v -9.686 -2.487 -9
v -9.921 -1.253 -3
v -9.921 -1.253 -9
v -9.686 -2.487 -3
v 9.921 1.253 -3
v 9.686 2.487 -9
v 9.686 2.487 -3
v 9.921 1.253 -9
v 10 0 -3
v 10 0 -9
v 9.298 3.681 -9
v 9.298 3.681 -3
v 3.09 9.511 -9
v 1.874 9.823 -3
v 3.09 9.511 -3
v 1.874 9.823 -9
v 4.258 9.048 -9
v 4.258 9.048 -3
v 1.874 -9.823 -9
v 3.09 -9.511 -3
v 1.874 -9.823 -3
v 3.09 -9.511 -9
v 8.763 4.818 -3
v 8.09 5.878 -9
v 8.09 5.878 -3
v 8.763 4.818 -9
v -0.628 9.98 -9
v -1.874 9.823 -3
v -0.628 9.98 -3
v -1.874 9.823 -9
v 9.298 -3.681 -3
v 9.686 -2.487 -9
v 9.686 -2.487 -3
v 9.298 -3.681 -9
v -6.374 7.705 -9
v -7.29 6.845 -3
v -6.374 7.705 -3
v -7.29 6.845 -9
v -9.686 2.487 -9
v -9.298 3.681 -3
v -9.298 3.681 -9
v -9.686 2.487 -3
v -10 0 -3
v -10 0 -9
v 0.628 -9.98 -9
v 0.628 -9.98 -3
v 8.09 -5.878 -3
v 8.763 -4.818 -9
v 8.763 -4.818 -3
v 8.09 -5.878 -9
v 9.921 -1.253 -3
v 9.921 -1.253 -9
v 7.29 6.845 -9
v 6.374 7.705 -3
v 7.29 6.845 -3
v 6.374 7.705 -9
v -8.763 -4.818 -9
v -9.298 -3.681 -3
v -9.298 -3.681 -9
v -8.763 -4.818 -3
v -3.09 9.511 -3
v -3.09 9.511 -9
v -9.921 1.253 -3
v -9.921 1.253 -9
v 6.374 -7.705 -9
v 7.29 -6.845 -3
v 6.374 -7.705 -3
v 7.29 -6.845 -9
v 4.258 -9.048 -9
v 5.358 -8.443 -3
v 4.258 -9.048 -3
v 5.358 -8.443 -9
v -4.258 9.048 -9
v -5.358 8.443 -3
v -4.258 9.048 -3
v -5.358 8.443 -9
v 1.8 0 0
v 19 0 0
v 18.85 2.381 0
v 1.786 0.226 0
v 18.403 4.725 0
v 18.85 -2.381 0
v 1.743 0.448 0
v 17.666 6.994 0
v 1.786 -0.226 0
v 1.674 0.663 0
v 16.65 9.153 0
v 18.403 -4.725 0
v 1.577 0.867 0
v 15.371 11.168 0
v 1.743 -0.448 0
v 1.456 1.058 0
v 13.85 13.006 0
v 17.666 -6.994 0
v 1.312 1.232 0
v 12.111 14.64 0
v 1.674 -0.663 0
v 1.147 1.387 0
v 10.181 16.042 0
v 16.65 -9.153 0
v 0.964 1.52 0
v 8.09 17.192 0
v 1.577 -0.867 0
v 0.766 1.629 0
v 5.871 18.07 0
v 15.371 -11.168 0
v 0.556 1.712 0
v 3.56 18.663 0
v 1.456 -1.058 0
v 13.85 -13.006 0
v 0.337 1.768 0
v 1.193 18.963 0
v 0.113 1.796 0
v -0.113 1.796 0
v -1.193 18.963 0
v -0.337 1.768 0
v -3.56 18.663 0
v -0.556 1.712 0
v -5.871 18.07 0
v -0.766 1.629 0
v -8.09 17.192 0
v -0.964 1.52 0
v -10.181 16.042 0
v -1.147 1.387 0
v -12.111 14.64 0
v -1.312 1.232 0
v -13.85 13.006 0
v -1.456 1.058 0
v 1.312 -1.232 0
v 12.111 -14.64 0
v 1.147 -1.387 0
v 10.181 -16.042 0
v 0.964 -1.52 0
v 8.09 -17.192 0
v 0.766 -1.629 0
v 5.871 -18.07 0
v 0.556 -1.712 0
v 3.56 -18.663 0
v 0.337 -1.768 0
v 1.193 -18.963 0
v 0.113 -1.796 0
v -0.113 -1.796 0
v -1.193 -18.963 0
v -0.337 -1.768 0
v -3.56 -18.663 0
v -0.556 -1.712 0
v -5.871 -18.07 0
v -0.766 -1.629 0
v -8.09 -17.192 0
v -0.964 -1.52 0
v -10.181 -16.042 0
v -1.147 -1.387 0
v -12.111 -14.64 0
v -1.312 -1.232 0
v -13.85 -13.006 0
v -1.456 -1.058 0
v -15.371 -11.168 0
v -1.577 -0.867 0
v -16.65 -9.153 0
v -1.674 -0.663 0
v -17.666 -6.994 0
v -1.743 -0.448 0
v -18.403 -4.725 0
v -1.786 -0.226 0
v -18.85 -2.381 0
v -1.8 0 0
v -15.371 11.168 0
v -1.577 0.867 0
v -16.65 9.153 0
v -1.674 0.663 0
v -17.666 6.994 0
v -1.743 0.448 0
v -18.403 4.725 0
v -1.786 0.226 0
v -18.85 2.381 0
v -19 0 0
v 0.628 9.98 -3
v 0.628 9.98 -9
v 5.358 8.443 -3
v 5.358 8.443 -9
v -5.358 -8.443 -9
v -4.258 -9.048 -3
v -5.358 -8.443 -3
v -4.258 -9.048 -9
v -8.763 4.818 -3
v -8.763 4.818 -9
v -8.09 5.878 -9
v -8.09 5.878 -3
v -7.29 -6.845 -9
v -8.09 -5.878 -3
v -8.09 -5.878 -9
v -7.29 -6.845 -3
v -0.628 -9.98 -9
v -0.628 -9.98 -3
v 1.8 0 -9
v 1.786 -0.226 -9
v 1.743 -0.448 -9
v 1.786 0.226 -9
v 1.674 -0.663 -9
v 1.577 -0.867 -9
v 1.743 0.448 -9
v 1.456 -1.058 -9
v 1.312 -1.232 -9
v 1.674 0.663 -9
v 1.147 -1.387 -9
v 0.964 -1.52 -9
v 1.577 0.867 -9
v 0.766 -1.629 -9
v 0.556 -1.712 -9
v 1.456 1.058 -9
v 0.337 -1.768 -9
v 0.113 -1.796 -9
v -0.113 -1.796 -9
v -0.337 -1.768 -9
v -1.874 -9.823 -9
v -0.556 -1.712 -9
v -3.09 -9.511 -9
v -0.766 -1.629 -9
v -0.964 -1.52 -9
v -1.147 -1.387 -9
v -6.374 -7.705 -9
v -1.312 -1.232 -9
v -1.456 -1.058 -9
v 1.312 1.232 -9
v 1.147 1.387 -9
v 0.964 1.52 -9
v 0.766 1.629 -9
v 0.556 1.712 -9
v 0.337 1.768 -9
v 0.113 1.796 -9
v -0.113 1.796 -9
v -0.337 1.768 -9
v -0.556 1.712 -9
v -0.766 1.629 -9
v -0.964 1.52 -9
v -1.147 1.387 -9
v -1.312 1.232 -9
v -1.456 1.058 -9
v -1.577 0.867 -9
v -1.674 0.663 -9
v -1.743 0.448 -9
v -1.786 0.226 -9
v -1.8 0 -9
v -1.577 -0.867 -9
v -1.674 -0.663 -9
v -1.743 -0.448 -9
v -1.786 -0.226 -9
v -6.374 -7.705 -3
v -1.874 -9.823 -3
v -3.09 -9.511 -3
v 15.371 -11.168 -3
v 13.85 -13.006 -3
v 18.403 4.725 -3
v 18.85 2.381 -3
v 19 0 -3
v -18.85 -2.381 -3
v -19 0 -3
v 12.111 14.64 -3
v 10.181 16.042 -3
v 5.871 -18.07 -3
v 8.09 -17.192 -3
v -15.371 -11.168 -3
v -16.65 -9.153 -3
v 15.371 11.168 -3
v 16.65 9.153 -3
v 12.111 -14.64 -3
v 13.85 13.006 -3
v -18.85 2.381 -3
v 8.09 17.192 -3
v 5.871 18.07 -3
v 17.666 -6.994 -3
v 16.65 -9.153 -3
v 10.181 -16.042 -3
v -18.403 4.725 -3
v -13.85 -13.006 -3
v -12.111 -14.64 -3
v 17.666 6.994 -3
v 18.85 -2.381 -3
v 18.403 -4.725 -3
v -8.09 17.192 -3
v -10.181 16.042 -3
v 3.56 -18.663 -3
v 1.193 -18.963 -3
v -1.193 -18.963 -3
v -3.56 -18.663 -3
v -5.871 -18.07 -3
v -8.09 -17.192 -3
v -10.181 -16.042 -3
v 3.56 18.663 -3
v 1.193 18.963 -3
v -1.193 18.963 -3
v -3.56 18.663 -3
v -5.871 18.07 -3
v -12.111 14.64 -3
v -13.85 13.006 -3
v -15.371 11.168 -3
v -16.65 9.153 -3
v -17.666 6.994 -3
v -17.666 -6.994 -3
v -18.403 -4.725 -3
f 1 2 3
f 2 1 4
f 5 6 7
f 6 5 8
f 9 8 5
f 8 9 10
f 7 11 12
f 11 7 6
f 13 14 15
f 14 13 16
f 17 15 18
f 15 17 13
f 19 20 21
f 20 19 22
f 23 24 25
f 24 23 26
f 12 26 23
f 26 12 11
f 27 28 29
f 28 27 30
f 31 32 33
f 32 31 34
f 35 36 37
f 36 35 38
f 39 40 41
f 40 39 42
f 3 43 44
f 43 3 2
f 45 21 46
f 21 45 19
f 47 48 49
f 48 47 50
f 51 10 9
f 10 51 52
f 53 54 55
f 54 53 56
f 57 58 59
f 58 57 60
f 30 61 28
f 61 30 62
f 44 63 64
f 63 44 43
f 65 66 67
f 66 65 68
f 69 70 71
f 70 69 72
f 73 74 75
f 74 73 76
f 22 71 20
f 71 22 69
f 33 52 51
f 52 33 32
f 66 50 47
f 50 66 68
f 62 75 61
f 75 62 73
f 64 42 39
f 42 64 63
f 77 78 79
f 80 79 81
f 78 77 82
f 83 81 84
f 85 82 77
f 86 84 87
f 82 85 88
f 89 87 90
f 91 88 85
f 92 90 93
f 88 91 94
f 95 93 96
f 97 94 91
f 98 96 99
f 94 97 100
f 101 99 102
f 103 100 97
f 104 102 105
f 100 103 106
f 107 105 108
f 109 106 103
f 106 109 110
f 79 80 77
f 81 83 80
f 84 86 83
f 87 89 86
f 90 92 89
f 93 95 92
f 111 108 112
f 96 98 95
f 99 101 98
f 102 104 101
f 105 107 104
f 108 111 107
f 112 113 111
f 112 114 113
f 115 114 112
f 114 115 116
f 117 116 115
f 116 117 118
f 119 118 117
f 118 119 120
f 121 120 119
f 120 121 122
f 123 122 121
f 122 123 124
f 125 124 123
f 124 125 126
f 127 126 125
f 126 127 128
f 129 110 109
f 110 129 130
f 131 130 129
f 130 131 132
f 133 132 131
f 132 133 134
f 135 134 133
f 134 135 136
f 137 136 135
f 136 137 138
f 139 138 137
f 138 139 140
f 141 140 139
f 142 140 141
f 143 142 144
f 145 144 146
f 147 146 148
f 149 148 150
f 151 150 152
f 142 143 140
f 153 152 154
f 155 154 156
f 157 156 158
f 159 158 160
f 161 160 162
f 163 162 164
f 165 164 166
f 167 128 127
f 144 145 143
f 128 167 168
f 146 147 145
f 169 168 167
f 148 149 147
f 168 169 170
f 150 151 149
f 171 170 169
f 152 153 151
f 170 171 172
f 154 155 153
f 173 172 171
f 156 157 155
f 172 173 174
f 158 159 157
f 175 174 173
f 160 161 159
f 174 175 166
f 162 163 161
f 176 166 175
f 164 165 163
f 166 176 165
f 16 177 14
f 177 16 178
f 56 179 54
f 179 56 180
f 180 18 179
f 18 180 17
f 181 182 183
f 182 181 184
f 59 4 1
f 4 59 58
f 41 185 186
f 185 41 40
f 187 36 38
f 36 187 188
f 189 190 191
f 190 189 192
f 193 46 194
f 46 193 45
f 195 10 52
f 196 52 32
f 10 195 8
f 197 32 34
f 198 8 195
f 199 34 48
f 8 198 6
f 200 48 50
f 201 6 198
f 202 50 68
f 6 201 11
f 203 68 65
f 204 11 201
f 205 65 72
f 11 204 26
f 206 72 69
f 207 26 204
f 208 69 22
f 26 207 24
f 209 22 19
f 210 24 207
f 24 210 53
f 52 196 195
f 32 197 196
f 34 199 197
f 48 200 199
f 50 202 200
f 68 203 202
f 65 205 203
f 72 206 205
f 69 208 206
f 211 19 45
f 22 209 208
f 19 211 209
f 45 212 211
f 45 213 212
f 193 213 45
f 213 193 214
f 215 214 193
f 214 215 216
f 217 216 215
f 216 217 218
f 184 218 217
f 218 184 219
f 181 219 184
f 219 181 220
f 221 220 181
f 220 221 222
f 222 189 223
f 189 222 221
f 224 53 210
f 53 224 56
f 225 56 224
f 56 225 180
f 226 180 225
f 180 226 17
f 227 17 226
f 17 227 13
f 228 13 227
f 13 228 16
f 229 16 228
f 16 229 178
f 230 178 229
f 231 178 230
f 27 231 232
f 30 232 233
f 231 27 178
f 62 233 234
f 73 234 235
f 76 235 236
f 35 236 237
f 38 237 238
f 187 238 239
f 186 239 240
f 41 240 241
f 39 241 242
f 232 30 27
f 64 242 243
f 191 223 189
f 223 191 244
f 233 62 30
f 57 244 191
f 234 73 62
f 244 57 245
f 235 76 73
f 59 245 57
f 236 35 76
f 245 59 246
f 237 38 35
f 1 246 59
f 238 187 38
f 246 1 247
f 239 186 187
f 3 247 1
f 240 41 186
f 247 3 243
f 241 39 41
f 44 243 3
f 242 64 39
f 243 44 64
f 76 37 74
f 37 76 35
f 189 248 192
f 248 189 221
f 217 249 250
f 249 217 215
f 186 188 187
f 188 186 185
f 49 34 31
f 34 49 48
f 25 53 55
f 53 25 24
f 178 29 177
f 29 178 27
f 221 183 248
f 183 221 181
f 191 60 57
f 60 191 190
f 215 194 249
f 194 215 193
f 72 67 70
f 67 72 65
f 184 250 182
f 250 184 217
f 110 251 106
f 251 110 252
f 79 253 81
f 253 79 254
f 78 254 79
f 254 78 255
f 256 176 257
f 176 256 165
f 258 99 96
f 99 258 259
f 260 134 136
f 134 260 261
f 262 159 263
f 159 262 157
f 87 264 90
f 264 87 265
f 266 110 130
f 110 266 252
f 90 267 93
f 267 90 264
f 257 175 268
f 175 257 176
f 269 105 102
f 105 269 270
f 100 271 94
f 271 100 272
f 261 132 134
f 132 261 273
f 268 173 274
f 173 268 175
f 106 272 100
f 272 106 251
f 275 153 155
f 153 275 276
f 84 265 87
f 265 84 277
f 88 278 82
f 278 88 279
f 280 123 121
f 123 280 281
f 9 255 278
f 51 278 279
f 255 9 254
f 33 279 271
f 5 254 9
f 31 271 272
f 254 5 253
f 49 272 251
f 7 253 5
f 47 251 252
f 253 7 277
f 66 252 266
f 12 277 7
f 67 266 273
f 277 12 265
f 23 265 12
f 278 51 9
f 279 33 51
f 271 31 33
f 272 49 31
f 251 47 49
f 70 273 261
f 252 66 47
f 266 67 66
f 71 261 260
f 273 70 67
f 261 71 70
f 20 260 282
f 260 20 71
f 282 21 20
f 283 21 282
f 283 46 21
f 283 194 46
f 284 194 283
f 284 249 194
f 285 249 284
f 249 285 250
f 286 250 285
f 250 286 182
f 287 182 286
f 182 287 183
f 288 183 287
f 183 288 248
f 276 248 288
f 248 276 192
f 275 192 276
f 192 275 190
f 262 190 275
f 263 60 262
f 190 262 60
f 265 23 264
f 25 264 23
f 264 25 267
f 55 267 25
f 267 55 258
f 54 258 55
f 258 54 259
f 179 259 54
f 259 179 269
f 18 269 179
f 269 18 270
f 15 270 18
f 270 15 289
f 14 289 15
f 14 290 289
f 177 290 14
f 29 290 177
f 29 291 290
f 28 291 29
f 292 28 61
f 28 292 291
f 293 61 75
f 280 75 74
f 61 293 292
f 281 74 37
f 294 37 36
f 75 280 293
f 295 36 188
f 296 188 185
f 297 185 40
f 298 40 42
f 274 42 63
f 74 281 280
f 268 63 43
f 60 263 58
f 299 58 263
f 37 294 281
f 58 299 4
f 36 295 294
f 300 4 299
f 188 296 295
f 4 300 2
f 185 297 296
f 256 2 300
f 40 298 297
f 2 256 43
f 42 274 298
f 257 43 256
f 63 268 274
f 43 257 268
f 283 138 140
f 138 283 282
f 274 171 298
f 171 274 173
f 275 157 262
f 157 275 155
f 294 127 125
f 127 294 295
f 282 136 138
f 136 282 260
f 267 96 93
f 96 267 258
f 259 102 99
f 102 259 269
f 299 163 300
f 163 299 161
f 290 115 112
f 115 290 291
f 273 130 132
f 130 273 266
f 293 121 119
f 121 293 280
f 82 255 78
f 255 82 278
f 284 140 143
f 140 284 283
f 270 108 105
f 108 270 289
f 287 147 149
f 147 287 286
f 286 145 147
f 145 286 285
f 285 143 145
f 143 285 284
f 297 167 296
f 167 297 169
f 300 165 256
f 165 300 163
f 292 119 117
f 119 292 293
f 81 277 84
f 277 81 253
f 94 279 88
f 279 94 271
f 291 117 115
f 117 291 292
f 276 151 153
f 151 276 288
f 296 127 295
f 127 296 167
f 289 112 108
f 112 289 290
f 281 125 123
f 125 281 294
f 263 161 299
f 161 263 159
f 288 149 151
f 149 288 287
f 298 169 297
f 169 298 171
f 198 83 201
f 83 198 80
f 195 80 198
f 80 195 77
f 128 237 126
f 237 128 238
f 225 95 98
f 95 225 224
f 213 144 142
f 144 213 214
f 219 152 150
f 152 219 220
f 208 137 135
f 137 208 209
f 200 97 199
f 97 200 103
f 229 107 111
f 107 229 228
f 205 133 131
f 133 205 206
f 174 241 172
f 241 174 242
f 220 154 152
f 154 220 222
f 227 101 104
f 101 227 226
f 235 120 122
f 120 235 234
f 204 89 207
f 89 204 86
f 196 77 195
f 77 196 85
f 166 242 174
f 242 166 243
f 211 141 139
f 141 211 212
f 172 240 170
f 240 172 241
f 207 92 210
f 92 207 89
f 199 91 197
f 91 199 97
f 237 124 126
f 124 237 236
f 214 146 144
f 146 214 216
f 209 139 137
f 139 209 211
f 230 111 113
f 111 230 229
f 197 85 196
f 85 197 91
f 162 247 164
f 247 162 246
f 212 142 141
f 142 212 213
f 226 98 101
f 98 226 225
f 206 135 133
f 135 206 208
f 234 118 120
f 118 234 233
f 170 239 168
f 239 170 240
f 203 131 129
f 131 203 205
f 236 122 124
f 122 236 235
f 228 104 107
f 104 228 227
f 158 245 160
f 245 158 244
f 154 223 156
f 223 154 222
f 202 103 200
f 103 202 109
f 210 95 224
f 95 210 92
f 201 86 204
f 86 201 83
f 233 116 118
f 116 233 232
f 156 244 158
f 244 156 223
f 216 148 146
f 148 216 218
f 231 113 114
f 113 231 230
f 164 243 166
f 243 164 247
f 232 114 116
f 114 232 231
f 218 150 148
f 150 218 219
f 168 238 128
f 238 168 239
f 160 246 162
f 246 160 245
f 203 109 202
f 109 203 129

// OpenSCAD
$fn = 50;


difference() {
	union() {
		translate(v = [0, 0, -9.0000000000]) {
			cylinder(h = 9, r = 10.0000000000);
		}
		translate(v = [0, 0, -3.0000000000]) {
			cylinder(h = 3, r = 19.0000000000);
		}
	}
	union() {
		#translate(v = [0, 0, -9]) {
			cylinder(h = 9, r = 1.8000000000);
		}
	}
}
